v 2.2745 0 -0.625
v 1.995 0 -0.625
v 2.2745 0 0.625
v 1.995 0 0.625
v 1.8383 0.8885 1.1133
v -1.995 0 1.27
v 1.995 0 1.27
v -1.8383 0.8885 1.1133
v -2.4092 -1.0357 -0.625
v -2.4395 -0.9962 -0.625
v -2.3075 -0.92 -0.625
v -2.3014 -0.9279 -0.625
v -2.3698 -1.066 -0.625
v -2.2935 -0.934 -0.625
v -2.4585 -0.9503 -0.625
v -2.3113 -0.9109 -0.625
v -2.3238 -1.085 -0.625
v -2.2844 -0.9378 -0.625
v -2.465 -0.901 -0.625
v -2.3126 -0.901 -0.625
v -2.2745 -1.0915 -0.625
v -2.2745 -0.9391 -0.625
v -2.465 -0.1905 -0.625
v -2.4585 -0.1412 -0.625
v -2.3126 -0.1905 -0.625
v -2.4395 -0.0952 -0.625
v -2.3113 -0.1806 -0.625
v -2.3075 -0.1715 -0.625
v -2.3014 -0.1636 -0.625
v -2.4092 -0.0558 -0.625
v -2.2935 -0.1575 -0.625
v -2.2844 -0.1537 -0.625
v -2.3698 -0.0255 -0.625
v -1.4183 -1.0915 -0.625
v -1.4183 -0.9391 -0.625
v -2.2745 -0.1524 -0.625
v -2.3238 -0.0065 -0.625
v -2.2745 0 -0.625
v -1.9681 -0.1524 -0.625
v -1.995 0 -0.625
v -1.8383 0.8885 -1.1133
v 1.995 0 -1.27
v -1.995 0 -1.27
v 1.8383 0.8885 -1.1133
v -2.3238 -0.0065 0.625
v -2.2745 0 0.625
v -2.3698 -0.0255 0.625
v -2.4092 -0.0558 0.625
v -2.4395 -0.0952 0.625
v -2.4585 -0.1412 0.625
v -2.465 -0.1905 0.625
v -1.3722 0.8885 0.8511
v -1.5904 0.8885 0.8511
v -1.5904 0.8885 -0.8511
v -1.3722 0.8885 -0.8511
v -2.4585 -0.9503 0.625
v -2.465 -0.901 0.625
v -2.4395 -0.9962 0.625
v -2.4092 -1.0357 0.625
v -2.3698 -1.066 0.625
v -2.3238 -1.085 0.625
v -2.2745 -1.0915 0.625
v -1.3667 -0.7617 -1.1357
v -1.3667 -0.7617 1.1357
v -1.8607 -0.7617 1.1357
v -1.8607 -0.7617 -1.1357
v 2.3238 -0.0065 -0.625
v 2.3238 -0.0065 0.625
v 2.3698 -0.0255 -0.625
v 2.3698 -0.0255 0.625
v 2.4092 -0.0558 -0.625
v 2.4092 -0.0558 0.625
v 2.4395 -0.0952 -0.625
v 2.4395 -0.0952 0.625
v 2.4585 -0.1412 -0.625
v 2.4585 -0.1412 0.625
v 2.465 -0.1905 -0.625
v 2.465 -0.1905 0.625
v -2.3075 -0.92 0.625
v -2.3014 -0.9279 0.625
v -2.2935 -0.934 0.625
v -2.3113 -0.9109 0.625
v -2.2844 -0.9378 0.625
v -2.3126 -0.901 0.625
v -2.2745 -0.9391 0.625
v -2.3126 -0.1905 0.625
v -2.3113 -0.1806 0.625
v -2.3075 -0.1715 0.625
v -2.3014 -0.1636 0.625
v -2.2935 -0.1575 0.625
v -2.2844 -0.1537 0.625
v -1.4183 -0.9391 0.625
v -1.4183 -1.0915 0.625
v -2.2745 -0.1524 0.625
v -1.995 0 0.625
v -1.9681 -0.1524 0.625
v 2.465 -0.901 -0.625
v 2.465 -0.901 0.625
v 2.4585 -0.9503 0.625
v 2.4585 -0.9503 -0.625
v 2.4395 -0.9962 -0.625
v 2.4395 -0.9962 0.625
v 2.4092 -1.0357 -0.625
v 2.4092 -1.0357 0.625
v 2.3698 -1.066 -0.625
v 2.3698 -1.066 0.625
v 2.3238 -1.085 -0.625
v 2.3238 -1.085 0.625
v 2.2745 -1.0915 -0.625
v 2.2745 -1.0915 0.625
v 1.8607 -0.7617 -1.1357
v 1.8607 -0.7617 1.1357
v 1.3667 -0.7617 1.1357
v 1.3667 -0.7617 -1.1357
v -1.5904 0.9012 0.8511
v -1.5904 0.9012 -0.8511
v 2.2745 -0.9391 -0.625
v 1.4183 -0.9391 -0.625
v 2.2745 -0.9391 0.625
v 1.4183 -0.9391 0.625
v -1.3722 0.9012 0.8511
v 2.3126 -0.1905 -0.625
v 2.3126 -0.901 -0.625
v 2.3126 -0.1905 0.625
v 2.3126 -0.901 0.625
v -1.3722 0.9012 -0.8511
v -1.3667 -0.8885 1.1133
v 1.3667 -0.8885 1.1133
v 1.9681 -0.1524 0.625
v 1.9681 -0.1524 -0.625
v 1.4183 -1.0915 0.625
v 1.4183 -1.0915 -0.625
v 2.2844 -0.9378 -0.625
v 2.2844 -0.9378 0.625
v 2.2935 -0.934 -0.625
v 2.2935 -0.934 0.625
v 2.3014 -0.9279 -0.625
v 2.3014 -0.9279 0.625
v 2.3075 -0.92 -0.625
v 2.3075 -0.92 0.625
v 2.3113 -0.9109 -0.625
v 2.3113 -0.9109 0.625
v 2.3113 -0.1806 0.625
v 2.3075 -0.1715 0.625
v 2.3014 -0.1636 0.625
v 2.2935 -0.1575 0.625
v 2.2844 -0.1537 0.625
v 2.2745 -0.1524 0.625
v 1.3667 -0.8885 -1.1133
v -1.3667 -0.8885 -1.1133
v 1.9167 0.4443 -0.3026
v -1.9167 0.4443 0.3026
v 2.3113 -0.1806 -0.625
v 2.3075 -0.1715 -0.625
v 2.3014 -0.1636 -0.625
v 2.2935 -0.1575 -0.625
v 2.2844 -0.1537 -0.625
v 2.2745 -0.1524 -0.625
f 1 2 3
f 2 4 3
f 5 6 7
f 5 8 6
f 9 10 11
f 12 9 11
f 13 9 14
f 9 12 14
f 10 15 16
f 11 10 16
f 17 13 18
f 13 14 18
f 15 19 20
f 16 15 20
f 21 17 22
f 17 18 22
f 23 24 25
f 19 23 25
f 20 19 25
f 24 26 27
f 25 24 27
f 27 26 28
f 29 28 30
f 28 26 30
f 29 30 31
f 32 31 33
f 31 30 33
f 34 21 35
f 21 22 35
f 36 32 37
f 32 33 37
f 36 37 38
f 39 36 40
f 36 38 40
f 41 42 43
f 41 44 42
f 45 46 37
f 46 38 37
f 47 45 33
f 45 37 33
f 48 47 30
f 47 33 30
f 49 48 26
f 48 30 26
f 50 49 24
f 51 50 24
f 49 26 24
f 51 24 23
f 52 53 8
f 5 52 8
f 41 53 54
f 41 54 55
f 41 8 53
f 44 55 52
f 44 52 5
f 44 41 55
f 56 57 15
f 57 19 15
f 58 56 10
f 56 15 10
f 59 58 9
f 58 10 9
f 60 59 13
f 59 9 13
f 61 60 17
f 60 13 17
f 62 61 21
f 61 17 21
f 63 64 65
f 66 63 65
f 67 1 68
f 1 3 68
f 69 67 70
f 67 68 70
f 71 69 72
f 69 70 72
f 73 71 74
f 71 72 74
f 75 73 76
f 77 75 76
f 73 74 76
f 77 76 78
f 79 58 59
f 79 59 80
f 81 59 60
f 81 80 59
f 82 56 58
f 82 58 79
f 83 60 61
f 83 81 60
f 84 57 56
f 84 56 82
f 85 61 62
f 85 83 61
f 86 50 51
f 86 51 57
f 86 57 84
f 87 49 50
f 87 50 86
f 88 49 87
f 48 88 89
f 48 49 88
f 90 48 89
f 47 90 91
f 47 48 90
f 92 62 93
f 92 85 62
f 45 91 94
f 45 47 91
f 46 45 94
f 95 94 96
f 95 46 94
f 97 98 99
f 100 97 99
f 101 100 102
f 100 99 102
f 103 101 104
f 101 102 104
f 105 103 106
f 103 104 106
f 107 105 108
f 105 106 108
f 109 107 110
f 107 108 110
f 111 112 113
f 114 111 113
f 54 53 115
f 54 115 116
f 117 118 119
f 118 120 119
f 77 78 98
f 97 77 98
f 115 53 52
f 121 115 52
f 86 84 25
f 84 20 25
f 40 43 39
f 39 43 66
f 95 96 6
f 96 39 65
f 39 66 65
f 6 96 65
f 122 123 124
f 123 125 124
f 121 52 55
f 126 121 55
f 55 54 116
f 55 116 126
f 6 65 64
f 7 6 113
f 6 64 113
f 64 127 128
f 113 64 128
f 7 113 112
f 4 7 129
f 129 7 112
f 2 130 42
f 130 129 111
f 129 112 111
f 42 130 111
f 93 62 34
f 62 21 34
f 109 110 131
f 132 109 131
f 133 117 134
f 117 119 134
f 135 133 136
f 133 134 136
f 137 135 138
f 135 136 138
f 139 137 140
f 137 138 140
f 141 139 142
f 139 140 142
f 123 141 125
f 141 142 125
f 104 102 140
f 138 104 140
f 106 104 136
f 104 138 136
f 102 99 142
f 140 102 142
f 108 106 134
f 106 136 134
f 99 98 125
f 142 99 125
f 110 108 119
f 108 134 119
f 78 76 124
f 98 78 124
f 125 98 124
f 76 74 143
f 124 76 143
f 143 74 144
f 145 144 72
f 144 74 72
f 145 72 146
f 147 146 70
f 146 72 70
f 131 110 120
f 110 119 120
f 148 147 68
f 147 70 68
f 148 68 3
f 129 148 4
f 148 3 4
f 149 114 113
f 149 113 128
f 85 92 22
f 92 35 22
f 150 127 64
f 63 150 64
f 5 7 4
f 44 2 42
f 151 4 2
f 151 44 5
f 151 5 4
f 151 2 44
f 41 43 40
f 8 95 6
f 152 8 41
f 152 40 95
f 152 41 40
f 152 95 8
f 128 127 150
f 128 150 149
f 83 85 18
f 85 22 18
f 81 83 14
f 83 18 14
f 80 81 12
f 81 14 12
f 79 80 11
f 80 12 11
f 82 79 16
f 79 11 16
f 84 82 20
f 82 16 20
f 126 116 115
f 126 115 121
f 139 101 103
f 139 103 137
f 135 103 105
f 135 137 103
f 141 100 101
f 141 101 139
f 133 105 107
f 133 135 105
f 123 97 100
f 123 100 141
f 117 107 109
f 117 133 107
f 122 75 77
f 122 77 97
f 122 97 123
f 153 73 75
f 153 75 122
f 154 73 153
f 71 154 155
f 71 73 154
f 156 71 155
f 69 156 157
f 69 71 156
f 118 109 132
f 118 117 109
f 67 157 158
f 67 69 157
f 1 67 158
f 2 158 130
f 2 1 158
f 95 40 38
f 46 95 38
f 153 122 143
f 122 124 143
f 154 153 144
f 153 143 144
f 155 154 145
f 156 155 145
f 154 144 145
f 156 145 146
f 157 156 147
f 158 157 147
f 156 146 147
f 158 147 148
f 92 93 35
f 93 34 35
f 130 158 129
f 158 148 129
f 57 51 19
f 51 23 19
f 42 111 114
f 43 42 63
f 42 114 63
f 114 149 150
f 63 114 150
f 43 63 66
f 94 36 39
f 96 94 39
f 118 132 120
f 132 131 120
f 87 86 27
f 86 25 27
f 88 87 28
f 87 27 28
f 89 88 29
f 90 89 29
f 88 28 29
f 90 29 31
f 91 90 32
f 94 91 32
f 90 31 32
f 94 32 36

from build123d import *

# Parameters (mm, degrees)
SKETCH1_W                      = 3.99
SKETCH1_H                      = 2.54
BOSS_EXTRUDE1_DEPTH            = 0.888500052
BOSS_EXTRUDE1_TAPER            = 10
BOSS_EXTRUDE1_OTHER_WAY_DEPTH  = 0.888500052
BOSS_EXTRUDE1_OTHER_WAY_TAPER  = 10
BOSS_EXTRUDE2_DEPTH            = 0.625
CUT_EXTRUDE1_REACH             = 3.27
CUT_EXTRUDE1_DIRECTION_2_REACH = 3.27
SKETCH5_W                      = 0.218238159
SKETCH5_H                      = 1.702257636
BOSS_EXTRUDE3_DEPTH            = 0.0127


with BuildPart() as part:
    # Sketch1 → Boss-Extrude1 (new body)
    with BuildSketch(Plane(origin=(0, 0, 0), x_dir=(1, 0, 0), z_dir=(0, 1, 0))):
        Rectangle(SKETCH1_W, SKETCH1_H)
    extrude(amount=BOSS_EXTRUDE1_DEPTH, taper=BOSS_EXTRUDE1_TAPER)

    # Sketch1 → Boss-Extrude1 other way (add)
    with BuildSketch(Plane(origin=(0, 0, 0), x_dir=(1, 0, 0), z_dir=(0, 1, 0))):
        Rectangle(SKETCH1_W, SKETCH1_H)
    extrude(amount=-BOSS_EXTRUDE1_OTHER_WAY_DEPTH, taper=BOSS_EXTRUDE1_OTHER_WAY_TAPER)

    # Sketch2 → Boss-Extrude2 (add, symmetric)
    with BuildSketch(Plane.XY):
        with BuildLine():
            Line((-1.995, 0), (-2.2745, 0))
            ThreePointArc((-2.2745, 0), (-2.409203842, -0.055796158), (-2.465, -0.1905))
            Line((-2.465, -0.1905), (-2.465, -0.900999948))
            ThreePointArc((-2.465, -0.900999948), (-2.409203842, -1.03570379), (-2.2745, -1.091499948))
            Line((-2.2745, -1.091499948), (-1.4182914, -1.091499948))
            Line((-1.4182914, -1.091499948), (-1.4182914, -0.939099948))
            Line((-1.4182914, -0.939099948), (-2.2745, -0.939099948))
            ThreePointArc((-2.2745, -0.939099948), (-2.301440768, -0.927940716), (-2.3126, -0.900999948))
            Line((-2.3126, -0.900999948), (-2.3126, -0.1905))
            ThreePointArc((-2.3126, -0.1905), (-2.301440768, -0.163559232), (-2.2745, -0.1524))
            Line((-2.2745, -0.1524), (-1.968127768, -0.1524))
            Line((-1.968127768, -0.1524), (-1.995, 0))
        make_face()
        with BuildLine():
            Line((2.2745, -1.091499948), (1.4182914, -1.091499948))
            Line((1.4182914, -1.091499948), (1.4182914, -0.939099948))
            Line((1.4182914, -0.939099948), (2.2745, -0.939099948))
            ThreePointArc((2.2745, -0.939099948), (2.301440768, -0.927940716), (2.3126, -0.900999948))
            Line((2.3126, -0.900999948), (2.3126, -0.1905))
            ThreePointArc((2.3126, -0.1905), (2.301440768, -0.163559232), (2.2745, -0.1524))
            Line((2.2745, -0.1524), (1.968127768, -0.1524))
            Line((1.968127768, -0.1524), (1.995, 0))
            Line((1.995, 0), (2.2745, 0))
            ThreePointArc((2.2745, 0), (2.409203842, -0.055796158), (2.465, -0.1905))
            Line((2.465, -0.1905), (2.465, -0.900999948))
            ThreePointArc((2.465, -0.900999948), (2.409203842, -1.03570379), (2.2745, -1.091499948))
        make_face()
    extrude(amount=BOSS_EXTRUDE2_DEPTH, both=True)

    # Sketch3 → Cut-Extrude1 (cut, up to next)
    with BuildSketch(Plane.XY, mode=Mode.PRIVATE) as cut_extrude1_sk1:
        Polygon((-1.838333468, -0.888500052), (-1.366716467, -0.888500052), (-1.366716467, -0.761670377), (-1.860696962, -0.761670377), align=None)
    cut_extrude1_tool1 = extrude(cut_extrude1_sk1.sketch, amount=-CUT_EXTRUDE1_REACH, mode=Mode.PRIVATE) & part.part
    add(cut_extrude1_tool1.solids().sort_by_distance((-1.608159, -0.824596, 0))[0], mode=Mode.SUBTRACT)
    # Sketch3 → Cut-Extrude1 (cut, up to next)
    with BuildSketch(Plane.XY, mode=Mode.PRIVATE) as cut_extrude1_sk2:
        Polygon((1.838333468, -0.888500052), (1.860696962, -0.761670377), (1.366716467, -0.761670377), (1.366716467, -0.888500052), align=None)
    cut_extrude1_tool2 = extrude(cut_extrude1_sk2.sketch, amount=-CUT_EXTRUDE1_REACH, mode=Mode.PRIVATE) & part.part
    add(cut_extrude1_tool2.solids().sort_by_distance((1.608159, -0.824596, 0))[0], mode=Mode.SUBTRACT)

    # Sketch3 → Cut-Extrude1 direction 2 (cut, up to next)
    with BuildSketch(Plane.XY, mode=Mode.PRIVATE) as cut_extrude1_direction_2_sk1:
        Polygon((-1.838333468, -0.888500052), (-1.366716467, -0.888500052), (-1.366716467, -0.761670377), (-1.860696962, -0.761670377), align=None)
    cut_extrude1_direction_2_tool1 = extrude(cut_extrude1_direction_2_sk1.sketch, amount=CUT_EXTRUDE1_DIRECTION_2_REACH, mode=Mode.PRIVATE) & part.part
    add(cut_extrude1_direction_2_tool1.solids().sort_by_distance((-1.608159, -0.824596, 0))[0], mode=Mode.SUBTRACT)
    # Sketch3 → Cut-Extrude1 direction 2 (cut, up to next)
    with BuildSketch(Plane.XY, mode=Mode.PRIVATE) as cut_extrude1_direction_2_sk2:
        Polygon((1.838333468, -0.888500052), (1.860696962, -0.761670377), (1.366716467, -0.761670377), (1.366716467, -0.888500052), align=None)
    cut_extrude1_direction_2_tool2 = extrude(cut_extrude1_direction_2_sk2.sketch, amount=CUT_EXTRUDE1_DIRECTION_2_REACH, mode=Mode.PRIVATE) & part.part
    add(cut_extrude1_direction_2_tool2.solids().sort_by_distance((1.608159, -0.824596, 0))[0], mode=Mode.SUBTRACT)

    # Sketch5 → Boss-Extrude3 (add)
    with BuildSketch(Plane(origin=(0, 0.888500052, 0), x_dir=(1, 0, 0), z_dir=(0, 1, 0))):
        with Locations((-1.481291501, 0)):
            Rectangle(SKETCH5_W, SKETCH5_H)
    extrude(amount=BOSS_EXTRUDE3_DEPTH)


solid = part.part
